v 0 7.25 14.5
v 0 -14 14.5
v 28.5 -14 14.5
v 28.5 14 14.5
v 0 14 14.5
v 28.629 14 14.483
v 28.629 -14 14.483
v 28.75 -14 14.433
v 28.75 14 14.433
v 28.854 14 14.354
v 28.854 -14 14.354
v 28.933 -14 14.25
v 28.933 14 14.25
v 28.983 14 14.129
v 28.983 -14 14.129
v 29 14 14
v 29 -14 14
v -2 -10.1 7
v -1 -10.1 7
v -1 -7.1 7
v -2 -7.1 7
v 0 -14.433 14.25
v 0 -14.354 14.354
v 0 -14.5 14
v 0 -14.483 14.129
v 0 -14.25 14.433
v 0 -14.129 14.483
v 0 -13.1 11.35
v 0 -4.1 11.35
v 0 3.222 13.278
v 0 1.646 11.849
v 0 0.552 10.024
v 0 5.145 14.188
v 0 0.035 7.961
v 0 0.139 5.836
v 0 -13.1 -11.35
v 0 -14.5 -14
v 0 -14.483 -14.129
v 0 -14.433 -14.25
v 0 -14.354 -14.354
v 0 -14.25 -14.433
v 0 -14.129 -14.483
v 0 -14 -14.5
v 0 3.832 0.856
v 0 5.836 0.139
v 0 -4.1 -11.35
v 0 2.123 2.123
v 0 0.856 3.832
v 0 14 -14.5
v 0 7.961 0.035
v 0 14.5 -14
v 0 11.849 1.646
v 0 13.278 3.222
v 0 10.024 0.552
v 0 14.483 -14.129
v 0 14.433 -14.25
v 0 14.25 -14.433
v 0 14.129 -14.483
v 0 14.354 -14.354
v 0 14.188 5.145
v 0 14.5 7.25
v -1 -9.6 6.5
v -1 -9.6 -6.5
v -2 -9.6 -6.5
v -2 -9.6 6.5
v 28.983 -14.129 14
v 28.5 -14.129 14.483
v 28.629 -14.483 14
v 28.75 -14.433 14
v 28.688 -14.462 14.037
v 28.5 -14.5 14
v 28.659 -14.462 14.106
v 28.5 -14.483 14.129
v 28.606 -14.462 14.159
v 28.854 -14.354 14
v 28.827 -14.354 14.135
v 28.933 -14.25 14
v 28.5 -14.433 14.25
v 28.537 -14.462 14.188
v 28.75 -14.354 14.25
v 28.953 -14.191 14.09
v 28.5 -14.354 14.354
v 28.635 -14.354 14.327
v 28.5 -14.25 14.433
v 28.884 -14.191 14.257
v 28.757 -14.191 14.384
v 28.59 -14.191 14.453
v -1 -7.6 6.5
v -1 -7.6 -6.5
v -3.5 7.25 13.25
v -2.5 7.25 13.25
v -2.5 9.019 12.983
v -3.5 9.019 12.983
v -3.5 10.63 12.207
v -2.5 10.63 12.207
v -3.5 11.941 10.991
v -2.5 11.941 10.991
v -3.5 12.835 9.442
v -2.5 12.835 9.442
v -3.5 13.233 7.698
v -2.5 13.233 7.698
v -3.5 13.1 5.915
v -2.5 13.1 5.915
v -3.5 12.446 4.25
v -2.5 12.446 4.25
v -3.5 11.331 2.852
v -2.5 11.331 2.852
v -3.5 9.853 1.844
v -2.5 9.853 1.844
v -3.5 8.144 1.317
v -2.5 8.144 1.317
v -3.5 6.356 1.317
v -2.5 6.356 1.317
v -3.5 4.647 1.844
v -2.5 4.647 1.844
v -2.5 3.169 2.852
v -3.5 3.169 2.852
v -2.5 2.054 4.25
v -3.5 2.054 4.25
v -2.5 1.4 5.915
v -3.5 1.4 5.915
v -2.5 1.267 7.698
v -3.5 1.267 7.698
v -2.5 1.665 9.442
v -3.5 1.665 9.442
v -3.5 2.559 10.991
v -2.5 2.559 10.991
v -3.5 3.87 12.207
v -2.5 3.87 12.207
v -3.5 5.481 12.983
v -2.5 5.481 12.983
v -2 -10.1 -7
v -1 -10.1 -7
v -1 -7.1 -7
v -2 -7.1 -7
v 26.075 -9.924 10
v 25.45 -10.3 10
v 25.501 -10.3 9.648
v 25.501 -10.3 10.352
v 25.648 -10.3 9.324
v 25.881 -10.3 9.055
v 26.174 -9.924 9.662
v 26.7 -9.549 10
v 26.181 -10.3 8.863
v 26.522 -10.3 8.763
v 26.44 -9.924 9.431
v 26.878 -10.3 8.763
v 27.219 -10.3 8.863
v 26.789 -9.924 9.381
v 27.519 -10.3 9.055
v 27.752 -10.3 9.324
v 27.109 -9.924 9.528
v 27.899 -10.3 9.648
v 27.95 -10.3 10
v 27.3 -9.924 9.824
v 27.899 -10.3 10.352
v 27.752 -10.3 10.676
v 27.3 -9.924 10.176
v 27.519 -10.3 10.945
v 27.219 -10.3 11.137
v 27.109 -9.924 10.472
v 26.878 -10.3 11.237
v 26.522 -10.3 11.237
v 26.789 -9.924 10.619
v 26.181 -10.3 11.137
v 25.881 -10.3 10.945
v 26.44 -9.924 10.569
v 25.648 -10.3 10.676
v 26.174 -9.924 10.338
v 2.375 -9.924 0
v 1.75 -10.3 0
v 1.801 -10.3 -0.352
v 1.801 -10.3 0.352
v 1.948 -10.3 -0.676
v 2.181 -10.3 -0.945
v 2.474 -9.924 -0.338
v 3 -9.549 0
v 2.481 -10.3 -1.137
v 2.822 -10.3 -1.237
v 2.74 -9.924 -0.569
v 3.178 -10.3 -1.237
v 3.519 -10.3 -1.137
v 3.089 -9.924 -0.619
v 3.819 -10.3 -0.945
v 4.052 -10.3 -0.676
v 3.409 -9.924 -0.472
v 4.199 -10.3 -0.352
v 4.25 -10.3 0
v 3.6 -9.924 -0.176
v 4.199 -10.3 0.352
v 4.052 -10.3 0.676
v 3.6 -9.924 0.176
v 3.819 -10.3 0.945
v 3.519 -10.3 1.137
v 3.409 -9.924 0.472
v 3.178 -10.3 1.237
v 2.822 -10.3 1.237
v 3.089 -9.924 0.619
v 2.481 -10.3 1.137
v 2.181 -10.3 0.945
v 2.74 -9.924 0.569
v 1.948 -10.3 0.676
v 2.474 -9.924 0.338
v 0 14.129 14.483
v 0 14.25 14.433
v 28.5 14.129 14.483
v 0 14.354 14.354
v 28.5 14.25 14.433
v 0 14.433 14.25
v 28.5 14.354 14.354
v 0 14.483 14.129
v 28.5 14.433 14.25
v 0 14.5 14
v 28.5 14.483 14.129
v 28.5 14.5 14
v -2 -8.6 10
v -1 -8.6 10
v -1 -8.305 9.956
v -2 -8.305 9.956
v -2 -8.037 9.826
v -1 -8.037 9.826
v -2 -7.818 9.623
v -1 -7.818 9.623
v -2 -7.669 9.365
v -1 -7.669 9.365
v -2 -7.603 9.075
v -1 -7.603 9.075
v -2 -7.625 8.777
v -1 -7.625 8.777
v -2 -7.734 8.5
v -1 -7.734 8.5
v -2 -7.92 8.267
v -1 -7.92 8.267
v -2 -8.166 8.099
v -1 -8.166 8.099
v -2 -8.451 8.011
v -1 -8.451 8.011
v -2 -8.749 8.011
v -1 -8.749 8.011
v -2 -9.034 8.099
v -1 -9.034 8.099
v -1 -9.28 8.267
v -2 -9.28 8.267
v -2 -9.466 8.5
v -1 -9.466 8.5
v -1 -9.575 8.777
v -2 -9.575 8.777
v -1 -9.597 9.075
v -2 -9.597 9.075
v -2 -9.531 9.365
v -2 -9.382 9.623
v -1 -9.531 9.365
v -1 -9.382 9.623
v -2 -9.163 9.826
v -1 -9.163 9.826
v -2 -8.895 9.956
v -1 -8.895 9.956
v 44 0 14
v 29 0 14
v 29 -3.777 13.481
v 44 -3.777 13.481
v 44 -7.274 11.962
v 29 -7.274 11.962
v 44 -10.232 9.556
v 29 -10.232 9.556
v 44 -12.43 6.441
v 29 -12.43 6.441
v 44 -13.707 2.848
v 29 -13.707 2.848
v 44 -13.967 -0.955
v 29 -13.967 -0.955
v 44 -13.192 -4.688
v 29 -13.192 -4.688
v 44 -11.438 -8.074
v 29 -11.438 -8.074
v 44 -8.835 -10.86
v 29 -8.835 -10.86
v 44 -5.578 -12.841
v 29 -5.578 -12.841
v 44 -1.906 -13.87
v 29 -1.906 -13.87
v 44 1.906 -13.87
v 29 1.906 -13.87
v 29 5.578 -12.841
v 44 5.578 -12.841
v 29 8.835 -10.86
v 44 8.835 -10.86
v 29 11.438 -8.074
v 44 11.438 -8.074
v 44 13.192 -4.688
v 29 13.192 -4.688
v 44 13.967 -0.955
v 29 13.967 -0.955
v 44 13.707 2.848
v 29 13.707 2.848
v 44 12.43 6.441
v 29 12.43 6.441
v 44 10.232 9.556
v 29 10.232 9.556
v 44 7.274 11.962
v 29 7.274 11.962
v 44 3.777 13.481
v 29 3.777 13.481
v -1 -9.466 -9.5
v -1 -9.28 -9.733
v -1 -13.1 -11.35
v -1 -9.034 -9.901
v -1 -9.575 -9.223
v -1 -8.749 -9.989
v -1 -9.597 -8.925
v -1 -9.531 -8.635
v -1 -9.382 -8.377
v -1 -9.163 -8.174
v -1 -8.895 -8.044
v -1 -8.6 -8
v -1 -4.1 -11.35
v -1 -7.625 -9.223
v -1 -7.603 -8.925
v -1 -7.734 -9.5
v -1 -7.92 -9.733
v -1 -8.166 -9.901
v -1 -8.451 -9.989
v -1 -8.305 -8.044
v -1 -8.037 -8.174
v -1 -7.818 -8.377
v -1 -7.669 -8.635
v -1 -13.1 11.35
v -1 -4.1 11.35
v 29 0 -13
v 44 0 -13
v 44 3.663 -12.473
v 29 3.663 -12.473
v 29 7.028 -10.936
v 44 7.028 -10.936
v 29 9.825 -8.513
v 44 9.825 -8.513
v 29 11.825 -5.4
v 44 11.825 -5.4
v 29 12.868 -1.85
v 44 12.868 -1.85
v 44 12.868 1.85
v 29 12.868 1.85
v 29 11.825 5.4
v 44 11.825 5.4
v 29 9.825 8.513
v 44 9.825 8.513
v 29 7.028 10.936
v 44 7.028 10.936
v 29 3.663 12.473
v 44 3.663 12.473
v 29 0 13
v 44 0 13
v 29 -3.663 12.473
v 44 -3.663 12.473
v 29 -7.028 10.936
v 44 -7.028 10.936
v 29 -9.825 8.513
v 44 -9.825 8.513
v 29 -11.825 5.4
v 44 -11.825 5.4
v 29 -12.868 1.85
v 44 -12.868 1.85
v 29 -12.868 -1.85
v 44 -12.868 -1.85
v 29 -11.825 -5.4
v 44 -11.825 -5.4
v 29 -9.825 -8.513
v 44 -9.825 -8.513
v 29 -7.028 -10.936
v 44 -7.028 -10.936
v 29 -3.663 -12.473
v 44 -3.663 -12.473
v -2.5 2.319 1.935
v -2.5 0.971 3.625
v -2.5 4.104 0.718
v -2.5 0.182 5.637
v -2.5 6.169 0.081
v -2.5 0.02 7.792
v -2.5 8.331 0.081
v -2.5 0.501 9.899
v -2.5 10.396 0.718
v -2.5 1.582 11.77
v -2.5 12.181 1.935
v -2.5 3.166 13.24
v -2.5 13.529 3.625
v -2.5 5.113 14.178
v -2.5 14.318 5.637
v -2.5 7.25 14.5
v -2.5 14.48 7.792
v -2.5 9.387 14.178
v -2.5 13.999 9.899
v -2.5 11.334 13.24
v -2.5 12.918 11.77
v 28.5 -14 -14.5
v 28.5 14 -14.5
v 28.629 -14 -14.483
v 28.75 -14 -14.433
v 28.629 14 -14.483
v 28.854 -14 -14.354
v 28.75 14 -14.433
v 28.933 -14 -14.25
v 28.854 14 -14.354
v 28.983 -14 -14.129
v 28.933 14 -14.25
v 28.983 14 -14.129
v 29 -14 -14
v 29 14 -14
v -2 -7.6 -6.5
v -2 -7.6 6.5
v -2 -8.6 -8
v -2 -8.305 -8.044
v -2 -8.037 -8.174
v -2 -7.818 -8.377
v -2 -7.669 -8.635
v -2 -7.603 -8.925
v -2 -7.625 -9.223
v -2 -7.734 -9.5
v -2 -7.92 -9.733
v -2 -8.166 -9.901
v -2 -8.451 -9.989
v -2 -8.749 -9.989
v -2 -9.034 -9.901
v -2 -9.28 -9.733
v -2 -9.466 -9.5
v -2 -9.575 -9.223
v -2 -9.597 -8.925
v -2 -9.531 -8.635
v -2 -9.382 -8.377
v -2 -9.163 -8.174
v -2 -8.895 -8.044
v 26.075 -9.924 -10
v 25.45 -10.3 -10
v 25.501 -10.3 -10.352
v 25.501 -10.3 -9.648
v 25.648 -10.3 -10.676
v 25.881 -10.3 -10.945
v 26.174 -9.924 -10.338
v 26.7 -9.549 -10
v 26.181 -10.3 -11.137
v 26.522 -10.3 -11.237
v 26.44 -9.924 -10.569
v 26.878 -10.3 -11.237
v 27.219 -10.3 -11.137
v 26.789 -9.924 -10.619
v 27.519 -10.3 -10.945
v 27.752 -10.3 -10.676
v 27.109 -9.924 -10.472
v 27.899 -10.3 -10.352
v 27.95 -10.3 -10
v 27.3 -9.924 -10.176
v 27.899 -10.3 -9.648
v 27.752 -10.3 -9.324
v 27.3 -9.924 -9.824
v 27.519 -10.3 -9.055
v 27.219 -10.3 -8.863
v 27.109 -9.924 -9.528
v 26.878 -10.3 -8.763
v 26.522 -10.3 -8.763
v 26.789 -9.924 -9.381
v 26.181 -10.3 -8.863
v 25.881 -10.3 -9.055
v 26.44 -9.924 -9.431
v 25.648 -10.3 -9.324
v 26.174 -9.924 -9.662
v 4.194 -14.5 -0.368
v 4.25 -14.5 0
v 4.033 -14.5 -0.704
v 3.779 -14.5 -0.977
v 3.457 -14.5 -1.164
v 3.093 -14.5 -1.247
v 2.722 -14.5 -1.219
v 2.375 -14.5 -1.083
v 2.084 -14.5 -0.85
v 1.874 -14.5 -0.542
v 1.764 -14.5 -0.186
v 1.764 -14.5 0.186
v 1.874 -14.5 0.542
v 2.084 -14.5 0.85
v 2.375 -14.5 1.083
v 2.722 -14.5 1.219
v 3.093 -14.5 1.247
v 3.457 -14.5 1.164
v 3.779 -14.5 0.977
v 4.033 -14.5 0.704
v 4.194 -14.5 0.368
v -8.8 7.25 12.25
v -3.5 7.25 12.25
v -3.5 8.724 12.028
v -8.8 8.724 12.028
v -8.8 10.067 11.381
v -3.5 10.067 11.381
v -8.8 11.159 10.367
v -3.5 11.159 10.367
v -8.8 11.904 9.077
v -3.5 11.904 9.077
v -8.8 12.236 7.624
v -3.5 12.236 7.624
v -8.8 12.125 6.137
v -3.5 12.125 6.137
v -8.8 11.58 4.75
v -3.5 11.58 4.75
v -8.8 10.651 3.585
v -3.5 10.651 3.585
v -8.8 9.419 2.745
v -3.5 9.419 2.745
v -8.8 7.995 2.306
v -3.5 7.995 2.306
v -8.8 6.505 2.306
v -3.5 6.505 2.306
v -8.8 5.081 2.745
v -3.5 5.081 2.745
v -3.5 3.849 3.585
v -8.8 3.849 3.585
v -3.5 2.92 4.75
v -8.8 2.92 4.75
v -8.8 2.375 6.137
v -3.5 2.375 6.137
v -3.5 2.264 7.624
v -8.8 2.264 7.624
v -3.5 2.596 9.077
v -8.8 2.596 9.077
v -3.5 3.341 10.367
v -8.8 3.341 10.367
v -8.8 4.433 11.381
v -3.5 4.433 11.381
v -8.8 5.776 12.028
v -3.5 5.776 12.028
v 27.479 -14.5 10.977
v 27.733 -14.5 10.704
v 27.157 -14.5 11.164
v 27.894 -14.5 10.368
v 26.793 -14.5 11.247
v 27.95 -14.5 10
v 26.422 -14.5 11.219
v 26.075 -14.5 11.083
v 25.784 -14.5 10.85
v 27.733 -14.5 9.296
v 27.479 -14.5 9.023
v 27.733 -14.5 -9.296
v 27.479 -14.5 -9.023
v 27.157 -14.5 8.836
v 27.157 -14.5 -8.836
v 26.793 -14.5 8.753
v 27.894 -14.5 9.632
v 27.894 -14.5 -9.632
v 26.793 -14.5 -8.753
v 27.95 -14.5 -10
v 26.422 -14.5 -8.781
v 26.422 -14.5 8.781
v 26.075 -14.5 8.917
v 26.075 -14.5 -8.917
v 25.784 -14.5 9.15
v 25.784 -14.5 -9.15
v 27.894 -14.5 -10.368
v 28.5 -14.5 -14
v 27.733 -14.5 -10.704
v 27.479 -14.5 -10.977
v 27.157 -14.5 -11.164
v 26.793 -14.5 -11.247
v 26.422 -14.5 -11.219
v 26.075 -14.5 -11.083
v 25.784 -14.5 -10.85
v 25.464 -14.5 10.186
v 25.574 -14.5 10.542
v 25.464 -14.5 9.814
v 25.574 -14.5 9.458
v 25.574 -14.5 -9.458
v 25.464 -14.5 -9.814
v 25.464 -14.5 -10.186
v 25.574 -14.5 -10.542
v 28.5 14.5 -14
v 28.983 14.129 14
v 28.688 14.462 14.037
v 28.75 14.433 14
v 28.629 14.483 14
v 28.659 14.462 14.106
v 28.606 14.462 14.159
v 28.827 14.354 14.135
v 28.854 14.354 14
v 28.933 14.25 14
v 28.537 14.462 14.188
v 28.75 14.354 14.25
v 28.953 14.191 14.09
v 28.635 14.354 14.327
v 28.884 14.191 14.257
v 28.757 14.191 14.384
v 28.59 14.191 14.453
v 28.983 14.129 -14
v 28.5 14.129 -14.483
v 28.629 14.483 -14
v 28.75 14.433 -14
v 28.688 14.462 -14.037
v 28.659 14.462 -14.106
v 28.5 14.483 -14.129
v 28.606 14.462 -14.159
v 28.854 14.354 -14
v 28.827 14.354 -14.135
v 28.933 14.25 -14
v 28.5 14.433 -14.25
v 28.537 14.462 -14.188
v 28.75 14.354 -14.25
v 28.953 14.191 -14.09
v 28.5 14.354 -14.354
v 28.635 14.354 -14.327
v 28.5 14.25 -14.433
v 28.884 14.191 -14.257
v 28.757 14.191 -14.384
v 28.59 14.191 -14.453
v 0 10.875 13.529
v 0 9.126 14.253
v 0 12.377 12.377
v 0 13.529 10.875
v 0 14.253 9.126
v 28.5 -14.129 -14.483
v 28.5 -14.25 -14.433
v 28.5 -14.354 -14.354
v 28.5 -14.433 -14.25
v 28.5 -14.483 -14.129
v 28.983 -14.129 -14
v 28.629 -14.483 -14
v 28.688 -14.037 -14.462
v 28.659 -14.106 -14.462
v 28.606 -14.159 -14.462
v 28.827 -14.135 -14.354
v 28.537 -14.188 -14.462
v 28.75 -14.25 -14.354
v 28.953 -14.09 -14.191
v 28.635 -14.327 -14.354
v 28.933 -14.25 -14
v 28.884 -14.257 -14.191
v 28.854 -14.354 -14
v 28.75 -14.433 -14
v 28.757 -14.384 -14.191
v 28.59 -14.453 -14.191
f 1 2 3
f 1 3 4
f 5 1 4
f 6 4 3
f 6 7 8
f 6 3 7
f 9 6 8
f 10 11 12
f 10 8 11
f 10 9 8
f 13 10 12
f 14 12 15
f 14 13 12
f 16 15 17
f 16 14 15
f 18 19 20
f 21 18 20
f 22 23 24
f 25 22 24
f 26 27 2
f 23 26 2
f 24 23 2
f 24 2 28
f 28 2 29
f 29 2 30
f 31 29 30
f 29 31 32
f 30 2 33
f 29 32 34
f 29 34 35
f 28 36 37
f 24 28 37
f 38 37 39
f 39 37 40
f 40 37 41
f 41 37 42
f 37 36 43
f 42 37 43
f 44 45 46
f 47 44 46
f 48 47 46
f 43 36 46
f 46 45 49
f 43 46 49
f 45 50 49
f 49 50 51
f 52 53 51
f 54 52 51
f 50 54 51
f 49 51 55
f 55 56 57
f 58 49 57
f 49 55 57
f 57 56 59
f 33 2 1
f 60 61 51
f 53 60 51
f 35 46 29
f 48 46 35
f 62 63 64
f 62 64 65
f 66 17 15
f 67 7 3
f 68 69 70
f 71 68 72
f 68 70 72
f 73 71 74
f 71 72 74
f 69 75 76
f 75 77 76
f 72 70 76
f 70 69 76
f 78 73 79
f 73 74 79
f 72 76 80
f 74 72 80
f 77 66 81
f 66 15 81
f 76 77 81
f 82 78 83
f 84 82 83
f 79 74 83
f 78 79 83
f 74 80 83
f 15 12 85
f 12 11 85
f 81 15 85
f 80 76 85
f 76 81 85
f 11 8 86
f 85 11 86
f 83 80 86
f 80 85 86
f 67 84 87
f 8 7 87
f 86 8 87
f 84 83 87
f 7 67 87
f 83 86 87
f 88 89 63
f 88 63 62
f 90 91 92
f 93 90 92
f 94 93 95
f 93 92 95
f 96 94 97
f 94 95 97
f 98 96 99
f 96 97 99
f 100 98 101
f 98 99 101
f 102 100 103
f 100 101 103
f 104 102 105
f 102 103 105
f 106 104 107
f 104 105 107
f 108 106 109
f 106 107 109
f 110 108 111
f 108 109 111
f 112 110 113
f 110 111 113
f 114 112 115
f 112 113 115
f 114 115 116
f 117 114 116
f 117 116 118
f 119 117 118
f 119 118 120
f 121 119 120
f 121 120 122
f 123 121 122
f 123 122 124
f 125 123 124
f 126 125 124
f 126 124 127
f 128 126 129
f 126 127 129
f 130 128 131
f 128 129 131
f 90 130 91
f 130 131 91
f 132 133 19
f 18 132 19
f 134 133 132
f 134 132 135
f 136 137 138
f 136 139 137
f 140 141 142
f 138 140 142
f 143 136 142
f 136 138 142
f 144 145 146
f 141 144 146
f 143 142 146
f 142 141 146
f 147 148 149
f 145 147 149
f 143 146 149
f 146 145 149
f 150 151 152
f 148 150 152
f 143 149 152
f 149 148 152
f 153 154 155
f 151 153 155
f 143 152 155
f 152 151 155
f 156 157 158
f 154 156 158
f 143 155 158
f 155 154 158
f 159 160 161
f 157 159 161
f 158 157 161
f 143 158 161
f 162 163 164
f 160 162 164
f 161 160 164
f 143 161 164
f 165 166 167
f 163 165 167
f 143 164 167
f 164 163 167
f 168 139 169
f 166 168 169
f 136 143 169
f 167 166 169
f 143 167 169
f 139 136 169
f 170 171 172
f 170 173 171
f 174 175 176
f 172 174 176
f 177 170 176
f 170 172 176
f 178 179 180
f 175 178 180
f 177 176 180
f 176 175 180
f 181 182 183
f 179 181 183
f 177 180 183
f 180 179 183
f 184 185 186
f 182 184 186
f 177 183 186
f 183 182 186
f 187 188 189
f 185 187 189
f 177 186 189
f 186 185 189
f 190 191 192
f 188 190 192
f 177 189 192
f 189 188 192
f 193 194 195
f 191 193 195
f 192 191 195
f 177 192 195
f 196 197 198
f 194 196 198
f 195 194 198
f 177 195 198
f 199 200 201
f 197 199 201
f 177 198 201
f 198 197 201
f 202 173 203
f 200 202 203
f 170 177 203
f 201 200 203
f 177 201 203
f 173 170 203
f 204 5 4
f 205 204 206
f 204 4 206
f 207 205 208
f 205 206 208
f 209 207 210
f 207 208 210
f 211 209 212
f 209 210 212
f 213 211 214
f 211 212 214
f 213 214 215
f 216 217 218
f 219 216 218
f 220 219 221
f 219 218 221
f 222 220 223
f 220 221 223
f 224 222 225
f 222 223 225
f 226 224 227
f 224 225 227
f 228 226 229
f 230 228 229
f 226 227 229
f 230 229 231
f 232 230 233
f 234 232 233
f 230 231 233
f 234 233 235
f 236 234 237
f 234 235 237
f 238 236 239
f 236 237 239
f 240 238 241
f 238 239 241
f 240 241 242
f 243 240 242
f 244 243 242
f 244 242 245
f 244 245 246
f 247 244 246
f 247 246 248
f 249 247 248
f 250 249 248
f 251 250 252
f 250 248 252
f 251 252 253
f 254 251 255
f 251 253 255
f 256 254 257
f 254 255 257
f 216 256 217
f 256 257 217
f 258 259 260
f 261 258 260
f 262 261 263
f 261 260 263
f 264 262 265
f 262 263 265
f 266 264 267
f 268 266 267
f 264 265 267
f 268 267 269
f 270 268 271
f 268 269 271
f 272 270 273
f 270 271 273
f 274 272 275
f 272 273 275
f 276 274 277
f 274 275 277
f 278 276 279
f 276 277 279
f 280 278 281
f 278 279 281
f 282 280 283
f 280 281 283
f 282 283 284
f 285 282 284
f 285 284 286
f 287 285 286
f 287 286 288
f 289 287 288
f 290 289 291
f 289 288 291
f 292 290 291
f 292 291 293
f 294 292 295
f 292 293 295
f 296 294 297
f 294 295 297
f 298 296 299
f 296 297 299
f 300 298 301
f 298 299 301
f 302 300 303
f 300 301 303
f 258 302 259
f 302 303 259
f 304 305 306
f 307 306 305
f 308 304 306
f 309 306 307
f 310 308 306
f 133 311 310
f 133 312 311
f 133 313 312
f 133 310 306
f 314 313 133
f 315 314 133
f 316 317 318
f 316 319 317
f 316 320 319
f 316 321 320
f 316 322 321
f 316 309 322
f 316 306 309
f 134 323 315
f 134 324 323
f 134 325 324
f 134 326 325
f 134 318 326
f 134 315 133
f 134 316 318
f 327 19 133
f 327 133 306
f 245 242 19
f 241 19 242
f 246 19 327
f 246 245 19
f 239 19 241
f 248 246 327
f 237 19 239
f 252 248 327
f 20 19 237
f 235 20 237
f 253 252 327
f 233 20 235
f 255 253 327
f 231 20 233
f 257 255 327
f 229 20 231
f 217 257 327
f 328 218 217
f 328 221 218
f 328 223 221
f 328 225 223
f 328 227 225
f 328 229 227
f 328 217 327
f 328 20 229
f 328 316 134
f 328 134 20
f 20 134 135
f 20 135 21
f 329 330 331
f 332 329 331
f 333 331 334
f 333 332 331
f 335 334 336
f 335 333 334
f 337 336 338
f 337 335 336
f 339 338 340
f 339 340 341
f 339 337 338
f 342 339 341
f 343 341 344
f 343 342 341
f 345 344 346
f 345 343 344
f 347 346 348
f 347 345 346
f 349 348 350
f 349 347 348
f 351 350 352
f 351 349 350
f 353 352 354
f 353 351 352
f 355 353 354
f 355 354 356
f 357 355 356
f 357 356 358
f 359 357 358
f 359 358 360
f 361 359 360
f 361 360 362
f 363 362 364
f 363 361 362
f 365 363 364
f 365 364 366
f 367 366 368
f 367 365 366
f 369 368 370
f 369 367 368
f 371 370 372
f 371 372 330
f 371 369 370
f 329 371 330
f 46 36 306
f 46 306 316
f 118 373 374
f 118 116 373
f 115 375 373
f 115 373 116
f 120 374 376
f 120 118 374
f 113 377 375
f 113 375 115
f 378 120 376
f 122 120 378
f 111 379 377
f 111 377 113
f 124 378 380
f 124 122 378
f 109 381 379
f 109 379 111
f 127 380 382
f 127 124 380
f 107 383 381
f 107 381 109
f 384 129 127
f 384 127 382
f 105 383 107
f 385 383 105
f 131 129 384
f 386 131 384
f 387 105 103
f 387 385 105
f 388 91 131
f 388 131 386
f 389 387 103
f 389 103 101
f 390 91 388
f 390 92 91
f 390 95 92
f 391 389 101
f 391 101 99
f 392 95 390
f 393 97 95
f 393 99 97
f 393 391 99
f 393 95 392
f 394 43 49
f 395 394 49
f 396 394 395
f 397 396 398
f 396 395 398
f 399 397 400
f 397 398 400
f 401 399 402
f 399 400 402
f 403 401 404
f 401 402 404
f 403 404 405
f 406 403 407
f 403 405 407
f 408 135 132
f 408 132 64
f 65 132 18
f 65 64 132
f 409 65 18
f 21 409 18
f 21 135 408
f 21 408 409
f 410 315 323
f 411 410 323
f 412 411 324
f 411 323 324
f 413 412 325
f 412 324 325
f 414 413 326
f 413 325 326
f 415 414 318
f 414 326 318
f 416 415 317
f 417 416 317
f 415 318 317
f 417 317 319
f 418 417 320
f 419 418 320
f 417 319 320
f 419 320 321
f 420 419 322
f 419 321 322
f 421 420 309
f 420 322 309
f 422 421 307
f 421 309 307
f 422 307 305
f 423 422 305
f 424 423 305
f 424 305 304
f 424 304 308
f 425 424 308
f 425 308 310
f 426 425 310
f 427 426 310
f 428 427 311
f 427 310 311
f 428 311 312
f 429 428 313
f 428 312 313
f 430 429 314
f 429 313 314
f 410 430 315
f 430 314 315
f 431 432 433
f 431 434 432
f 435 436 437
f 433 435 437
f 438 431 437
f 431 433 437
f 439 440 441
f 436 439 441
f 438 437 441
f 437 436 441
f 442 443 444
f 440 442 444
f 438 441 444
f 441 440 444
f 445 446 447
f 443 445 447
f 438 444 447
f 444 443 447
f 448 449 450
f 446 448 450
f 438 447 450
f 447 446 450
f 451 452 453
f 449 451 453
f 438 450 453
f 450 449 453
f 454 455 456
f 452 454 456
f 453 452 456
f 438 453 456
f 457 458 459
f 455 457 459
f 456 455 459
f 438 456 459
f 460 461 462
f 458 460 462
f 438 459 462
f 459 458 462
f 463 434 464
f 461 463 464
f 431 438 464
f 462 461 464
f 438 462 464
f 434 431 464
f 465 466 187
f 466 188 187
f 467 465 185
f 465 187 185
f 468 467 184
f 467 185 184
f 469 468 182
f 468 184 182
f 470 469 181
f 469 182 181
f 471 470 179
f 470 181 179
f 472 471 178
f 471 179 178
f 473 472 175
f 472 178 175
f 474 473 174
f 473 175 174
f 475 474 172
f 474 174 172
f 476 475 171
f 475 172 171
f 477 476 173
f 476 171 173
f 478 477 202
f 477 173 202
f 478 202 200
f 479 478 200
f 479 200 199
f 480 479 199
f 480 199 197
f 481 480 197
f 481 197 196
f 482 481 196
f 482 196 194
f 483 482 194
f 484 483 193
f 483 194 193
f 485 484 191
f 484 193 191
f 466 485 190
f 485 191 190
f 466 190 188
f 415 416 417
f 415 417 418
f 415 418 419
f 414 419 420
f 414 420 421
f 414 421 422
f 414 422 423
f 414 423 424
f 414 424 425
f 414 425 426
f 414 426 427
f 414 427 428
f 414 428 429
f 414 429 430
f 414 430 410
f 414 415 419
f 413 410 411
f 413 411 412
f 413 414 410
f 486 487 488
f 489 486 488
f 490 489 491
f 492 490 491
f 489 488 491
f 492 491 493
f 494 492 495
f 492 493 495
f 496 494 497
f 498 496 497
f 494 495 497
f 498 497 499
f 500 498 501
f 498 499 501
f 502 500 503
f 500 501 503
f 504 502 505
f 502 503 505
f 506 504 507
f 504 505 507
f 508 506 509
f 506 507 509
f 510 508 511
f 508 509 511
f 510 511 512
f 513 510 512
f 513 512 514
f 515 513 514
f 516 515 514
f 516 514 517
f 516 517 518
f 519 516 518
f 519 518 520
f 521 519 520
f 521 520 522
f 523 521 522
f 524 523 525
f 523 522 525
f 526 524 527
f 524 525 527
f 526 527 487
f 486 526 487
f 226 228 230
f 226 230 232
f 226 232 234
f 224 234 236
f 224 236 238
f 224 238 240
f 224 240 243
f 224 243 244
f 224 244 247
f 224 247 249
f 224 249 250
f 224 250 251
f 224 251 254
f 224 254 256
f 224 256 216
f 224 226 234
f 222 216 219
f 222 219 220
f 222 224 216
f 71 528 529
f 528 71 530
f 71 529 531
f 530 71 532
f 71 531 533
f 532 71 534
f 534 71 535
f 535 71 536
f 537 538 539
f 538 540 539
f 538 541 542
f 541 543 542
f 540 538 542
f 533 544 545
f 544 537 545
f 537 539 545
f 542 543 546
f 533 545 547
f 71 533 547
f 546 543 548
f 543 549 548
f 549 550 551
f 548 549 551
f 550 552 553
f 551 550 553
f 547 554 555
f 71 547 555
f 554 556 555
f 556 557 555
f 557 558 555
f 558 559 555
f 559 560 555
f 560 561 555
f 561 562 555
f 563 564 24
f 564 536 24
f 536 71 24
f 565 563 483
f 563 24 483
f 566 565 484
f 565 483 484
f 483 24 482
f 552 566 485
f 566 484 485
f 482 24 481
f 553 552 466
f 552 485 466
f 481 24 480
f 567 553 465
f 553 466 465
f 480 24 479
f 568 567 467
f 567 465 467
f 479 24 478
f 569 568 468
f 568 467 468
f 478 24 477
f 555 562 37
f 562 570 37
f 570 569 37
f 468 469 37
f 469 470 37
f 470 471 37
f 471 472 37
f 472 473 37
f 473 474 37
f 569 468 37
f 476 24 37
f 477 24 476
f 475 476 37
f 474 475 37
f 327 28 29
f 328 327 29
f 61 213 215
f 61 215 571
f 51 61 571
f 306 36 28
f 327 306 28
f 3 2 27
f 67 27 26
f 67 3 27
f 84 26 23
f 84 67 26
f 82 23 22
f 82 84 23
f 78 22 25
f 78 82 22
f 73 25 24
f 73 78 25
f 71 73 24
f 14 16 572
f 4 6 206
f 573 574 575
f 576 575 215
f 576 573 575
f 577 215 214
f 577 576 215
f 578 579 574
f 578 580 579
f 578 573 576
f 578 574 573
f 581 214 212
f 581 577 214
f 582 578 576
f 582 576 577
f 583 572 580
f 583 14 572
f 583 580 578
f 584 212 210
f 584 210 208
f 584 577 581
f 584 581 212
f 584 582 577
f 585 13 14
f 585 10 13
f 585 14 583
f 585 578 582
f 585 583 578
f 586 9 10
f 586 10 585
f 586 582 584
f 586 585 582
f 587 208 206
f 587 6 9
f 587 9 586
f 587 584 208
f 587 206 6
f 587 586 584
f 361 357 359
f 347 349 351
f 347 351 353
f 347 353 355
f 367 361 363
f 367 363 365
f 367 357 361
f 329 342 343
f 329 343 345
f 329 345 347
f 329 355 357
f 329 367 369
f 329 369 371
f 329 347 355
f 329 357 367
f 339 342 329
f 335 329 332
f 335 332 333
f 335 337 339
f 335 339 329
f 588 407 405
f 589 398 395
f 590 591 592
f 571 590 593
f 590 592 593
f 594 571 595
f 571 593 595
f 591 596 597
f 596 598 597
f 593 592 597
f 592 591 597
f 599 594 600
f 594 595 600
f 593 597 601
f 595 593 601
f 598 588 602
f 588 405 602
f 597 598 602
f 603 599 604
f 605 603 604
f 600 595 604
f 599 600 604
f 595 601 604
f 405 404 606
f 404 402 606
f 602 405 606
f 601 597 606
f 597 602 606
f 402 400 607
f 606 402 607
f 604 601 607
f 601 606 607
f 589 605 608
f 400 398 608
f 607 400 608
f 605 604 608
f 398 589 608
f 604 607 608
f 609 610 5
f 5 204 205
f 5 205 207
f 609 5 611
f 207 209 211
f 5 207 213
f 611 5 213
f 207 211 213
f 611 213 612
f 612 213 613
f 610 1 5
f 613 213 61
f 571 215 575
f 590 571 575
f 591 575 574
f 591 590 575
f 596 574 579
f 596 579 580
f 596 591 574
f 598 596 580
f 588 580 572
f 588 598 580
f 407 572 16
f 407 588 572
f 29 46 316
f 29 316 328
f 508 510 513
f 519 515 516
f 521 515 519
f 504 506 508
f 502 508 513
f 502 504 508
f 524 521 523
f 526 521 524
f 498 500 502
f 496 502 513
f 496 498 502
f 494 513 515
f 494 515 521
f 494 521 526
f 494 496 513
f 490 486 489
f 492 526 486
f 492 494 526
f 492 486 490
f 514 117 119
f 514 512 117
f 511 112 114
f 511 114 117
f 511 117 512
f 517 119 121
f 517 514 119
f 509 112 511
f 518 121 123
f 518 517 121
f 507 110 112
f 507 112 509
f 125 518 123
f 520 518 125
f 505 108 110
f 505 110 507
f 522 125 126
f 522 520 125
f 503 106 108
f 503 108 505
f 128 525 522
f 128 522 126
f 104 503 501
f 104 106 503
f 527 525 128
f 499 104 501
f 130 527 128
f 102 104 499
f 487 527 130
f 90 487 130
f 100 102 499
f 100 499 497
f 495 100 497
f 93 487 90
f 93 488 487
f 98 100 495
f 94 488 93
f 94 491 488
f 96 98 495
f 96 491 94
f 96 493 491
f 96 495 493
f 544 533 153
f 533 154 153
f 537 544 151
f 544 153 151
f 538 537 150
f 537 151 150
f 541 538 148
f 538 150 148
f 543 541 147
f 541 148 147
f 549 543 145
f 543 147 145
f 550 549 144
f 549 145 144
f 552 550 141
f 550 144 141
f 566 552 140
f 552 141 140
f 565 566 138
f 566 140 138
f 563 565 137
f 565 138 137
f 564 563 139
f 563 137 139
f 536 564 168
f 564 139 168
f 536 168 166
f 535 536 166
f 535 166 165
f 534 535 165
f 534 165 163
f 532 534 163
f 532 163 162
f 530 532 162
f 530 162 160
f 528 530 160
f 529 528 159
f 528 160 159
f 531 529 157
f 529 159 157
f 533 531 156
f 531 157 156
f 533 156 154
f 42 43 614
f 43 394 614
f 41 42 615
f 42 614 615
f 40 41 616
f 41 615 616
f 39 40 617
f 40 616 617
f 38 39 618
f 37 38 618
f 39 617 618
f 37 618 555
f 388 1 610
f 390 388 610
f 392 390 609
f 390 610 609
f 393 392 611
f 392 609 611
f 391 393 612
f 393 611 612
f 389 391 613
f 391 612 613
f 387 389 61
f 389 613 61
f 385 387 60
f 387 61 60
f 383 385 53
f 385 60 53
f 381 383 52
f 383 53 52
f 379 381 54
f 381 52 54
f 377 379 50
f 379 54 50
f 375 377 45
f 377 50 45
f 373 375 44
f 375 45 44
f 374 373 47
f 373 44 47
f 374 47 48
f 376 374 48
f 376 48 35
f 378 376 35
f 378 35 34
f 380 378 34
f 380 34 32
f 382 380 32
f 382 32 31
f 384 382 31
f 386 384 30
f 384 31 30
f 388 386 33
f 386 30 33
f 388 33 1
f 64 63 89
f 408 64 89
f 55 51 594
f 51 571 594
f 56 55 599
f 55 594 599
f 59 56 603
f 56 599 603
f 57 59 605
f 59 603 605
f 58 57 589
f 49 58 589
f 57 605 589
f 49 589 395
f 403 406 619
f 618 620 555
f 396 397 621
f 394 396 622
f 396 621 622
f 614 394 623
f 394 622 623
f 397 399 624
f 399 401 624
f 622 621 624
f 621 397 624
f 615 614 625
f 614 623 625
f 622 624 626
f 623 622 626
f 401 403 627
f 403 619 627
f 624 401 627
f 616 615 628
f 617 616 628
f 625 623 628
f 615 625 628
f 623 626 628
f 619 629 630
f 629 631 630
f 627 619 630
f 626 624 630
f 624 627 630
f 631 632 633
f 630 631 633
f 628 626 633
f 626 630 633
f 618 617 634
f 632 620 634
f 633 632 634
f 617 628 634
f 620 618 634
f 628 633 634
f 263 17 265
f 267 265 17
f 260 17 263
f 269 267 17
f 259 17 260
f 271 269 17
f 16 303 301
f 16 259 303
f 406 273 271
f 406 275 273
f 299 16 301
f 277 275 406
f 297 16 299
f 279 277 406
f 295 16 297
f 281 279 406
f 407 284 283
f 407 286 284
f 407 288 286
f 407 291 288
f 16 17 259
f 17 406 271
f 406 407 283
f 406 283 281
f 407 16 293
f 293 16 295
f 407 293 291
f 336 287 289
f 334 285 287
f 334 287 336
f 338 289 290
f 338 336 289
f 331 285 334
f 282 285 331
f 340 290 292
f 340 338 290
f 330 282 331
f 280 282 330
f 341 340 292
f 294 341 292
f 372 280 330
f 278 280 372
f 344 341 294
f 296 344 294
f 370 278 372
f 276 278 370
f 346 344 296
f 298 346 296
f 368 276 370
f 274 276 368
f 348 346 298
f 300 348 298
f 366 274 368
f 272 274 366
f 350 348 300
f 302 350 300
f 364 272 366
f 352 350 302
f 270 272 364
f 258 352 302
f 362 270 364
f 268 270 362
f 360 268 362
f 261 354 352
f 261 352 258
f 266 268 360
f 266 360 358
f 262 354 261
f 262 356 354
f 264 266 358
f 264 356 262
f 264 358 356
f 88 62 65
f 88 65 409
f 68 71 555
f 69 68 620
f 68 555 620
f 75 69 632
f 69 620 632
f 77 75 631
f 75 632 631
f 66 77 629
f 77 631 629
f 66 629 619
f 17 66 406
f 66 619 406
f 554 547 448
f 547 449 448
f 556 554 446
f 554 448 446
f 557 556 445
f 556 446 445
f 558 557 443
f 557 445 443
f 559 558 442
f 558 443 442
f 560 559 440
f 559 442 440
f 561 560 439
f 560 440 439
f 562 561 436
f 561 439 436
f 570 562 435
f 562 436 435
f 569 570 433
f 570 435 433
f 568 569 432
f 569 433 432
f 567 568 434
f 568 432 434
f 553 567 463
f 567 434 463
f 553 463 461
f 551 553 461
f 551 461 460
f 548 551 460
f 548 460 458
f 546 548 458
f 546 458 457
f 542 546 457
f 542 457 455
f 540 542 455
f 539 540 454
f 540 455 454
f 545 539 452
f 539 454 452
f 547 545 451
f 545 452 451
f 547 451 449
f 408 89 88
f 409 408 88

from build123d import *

# Parameters (mm, degrees)
SKETCH_1_W             = 29
SKETCH_1_H             = 29
EXTRUDE_1_DEPTH        = 29
SKETCH_3_W             = 22.7
SKETCH_3_H             = 9
EXTRUDE_3_DEPTH        = 1
SKETCH_4_R             = 1
SKETCH_4_W             = 14
SKETCH_4_H             = 3
SKETCH_4_W_2           = 13
SKETCH_4_H_2           = 2
EXTRUDE_4_DEPTH        = 1
SKETCH_5_R             = 7.25
EXTRUDE_5_DEPTH        = 2.5
SKETCH_6_R             = 6
EXTRUDE_6_DEPTH        = 1
SKETCH_7_R             = 5
EXTRUDE_7_DEPTH        = 5.3
SKETCH_8_R             = 14
SKETCH_8_R_2           = 13
EXTRUDE_8_DEPTH        = 15
HOLE_WIZARD_M3_1_D     = 2.5
HOLE_WIZARD_M3_1_DEPTH = 4.2
HOLE_WIZARD_M3_1_TIP   = 0.751075774
FILLET_1_R             = 0.5


with BuildPart() as part:
    # 草图1 → 凸台-拉伸1 (new body)
    with BuildSketch(Plane(origin=(0, 0, 0), x_dir=(0, 0, -1), z_dir=(1, 0, 0))):
        Rectangle(SKETCH_1_W, SKETCH_1_H)
    extrude(amount=EXTRUDE_1_DEPTH)

    # 草图3 → 凸台-拉伸3 (add)
    with BuildSketch(Plane.ZY):
        with Locations((0, -8.6)):
            Rectangle(SKETCH_3_W, SKETCH_3_H)
    extrude(amount=EXTRUDE_3_DEPTH)

    # 草图4 → 凸台-拉伸4 (add)
    # profile 1 of 3: a face of its own
    with BuildSketch(Plane.ZY.offset(1)):
        with Locations((-9, -8.6)):
            Circle(SKETCH_4_R)
    # profile 2 of 3: a face of its own
    with BuildSketch(Plane.ZY.offset(1)):
        with Locations((9, -8.6)):
            Circle(SKETCH_4_R)
    # profile 3 of 3: a face of its own
    with BuildSketch(Plane.ZY.offset(1)):
        with Locations((0, -8.6)):
            Rectangle(SKETCH_4_W, SKETCH_4_H)
        with Locations((0, -8.6)):
            Rectangle(SKETCH_4_W_2, SKETCH_4_H_2, mode=Mode.SUBTRACT)
    extrude(amount=EXTRUDE_4_DEPTH)

    # 草图5 → 凸台-拉伸5 (add)
    with BuildSketch(Plane.ZY):
        with Locations((7.25, 7.25)):
            Circle(SKETCH_5_R)
    extrude(amount=EXTRUDE_5_DEPTH)

    # 草图6 → 凸台-拉伸6 (add)
    with BuildSketch(Plane.ZY.offset(2.5)):
        with Locations((7.25, 7.25)):
            Circle(SKETCH_6_R)
    extrude(amount=EXTRUDE_6_DEPTH)

    # 草图7 → 凸台-拉伸7 (add)
    with BuildSketch(Plane.ZY.offset(3.5)):
        with Locations((7.25, 7.25)):
            Circle(SKETCH_7_R)
    extrude(amount=EXTRUDE_7_DEPTH)

    # 草图8 → 凸台-拉伸8 (add)
    with BuildSketch(Plane(origin=(29, 0, 0), x_dir=(0, 0, -1), z_dir=(1, 0, 0))):
        with Locations(Location((0, 0, 0), (0, 0, 180))):
            Circle(SKETCH_8_R)
        Circle(SKETCH_8_R_2, mode=Mode.SUBTRACT)
    extrude(amount=EXTRUDE_8_DEPTH)

    # M3 螺纹孔1
    with Locations(Plane(origin=(0, -14.5, 0), x_dir=(-1, 0, 0), z_dir=(0, -1, 0))):
        with Locations((-26.7, 10), (-26.7, -10), (-3, 0)):
            Hole(HOLE_WIZARD_M3_1_D / 2, depth=HOLE_WIZARD_M3_1_DEPTH)
            with Locations((0, 0, -(HOLE_WIZARD_M3_1_DEPTH + HOLE_WIZARD_M3_1_TIP / 2))):  # 118° drill point
                Cone(0, HOLE_WIZARD_M3_1_D / 2, HOLE_WIZARD_M3_1_TIP, mode=Mode.SUBTRACT)

    # 圆角1
    fillet_1_edges = [part.edges().sort_by_distance(p)[0] for p in [
        (29, 0, 14.5),
        (29, -14.5, 0),
        (29, 0, -14.5),
        (29, 14.5, 0),
        (14.5, -14.5, -14.5),
        (14.5, -14.5, 14.5),
        (14.5, 14.5, 14.5),
        (14.5, 14.5, -14.5),
    ]]
    fillet(fillet_1_edges, radius=FILLET_1_R - 0.0001)  # a hair under: the kernel refuses the full size


solid = part.part
